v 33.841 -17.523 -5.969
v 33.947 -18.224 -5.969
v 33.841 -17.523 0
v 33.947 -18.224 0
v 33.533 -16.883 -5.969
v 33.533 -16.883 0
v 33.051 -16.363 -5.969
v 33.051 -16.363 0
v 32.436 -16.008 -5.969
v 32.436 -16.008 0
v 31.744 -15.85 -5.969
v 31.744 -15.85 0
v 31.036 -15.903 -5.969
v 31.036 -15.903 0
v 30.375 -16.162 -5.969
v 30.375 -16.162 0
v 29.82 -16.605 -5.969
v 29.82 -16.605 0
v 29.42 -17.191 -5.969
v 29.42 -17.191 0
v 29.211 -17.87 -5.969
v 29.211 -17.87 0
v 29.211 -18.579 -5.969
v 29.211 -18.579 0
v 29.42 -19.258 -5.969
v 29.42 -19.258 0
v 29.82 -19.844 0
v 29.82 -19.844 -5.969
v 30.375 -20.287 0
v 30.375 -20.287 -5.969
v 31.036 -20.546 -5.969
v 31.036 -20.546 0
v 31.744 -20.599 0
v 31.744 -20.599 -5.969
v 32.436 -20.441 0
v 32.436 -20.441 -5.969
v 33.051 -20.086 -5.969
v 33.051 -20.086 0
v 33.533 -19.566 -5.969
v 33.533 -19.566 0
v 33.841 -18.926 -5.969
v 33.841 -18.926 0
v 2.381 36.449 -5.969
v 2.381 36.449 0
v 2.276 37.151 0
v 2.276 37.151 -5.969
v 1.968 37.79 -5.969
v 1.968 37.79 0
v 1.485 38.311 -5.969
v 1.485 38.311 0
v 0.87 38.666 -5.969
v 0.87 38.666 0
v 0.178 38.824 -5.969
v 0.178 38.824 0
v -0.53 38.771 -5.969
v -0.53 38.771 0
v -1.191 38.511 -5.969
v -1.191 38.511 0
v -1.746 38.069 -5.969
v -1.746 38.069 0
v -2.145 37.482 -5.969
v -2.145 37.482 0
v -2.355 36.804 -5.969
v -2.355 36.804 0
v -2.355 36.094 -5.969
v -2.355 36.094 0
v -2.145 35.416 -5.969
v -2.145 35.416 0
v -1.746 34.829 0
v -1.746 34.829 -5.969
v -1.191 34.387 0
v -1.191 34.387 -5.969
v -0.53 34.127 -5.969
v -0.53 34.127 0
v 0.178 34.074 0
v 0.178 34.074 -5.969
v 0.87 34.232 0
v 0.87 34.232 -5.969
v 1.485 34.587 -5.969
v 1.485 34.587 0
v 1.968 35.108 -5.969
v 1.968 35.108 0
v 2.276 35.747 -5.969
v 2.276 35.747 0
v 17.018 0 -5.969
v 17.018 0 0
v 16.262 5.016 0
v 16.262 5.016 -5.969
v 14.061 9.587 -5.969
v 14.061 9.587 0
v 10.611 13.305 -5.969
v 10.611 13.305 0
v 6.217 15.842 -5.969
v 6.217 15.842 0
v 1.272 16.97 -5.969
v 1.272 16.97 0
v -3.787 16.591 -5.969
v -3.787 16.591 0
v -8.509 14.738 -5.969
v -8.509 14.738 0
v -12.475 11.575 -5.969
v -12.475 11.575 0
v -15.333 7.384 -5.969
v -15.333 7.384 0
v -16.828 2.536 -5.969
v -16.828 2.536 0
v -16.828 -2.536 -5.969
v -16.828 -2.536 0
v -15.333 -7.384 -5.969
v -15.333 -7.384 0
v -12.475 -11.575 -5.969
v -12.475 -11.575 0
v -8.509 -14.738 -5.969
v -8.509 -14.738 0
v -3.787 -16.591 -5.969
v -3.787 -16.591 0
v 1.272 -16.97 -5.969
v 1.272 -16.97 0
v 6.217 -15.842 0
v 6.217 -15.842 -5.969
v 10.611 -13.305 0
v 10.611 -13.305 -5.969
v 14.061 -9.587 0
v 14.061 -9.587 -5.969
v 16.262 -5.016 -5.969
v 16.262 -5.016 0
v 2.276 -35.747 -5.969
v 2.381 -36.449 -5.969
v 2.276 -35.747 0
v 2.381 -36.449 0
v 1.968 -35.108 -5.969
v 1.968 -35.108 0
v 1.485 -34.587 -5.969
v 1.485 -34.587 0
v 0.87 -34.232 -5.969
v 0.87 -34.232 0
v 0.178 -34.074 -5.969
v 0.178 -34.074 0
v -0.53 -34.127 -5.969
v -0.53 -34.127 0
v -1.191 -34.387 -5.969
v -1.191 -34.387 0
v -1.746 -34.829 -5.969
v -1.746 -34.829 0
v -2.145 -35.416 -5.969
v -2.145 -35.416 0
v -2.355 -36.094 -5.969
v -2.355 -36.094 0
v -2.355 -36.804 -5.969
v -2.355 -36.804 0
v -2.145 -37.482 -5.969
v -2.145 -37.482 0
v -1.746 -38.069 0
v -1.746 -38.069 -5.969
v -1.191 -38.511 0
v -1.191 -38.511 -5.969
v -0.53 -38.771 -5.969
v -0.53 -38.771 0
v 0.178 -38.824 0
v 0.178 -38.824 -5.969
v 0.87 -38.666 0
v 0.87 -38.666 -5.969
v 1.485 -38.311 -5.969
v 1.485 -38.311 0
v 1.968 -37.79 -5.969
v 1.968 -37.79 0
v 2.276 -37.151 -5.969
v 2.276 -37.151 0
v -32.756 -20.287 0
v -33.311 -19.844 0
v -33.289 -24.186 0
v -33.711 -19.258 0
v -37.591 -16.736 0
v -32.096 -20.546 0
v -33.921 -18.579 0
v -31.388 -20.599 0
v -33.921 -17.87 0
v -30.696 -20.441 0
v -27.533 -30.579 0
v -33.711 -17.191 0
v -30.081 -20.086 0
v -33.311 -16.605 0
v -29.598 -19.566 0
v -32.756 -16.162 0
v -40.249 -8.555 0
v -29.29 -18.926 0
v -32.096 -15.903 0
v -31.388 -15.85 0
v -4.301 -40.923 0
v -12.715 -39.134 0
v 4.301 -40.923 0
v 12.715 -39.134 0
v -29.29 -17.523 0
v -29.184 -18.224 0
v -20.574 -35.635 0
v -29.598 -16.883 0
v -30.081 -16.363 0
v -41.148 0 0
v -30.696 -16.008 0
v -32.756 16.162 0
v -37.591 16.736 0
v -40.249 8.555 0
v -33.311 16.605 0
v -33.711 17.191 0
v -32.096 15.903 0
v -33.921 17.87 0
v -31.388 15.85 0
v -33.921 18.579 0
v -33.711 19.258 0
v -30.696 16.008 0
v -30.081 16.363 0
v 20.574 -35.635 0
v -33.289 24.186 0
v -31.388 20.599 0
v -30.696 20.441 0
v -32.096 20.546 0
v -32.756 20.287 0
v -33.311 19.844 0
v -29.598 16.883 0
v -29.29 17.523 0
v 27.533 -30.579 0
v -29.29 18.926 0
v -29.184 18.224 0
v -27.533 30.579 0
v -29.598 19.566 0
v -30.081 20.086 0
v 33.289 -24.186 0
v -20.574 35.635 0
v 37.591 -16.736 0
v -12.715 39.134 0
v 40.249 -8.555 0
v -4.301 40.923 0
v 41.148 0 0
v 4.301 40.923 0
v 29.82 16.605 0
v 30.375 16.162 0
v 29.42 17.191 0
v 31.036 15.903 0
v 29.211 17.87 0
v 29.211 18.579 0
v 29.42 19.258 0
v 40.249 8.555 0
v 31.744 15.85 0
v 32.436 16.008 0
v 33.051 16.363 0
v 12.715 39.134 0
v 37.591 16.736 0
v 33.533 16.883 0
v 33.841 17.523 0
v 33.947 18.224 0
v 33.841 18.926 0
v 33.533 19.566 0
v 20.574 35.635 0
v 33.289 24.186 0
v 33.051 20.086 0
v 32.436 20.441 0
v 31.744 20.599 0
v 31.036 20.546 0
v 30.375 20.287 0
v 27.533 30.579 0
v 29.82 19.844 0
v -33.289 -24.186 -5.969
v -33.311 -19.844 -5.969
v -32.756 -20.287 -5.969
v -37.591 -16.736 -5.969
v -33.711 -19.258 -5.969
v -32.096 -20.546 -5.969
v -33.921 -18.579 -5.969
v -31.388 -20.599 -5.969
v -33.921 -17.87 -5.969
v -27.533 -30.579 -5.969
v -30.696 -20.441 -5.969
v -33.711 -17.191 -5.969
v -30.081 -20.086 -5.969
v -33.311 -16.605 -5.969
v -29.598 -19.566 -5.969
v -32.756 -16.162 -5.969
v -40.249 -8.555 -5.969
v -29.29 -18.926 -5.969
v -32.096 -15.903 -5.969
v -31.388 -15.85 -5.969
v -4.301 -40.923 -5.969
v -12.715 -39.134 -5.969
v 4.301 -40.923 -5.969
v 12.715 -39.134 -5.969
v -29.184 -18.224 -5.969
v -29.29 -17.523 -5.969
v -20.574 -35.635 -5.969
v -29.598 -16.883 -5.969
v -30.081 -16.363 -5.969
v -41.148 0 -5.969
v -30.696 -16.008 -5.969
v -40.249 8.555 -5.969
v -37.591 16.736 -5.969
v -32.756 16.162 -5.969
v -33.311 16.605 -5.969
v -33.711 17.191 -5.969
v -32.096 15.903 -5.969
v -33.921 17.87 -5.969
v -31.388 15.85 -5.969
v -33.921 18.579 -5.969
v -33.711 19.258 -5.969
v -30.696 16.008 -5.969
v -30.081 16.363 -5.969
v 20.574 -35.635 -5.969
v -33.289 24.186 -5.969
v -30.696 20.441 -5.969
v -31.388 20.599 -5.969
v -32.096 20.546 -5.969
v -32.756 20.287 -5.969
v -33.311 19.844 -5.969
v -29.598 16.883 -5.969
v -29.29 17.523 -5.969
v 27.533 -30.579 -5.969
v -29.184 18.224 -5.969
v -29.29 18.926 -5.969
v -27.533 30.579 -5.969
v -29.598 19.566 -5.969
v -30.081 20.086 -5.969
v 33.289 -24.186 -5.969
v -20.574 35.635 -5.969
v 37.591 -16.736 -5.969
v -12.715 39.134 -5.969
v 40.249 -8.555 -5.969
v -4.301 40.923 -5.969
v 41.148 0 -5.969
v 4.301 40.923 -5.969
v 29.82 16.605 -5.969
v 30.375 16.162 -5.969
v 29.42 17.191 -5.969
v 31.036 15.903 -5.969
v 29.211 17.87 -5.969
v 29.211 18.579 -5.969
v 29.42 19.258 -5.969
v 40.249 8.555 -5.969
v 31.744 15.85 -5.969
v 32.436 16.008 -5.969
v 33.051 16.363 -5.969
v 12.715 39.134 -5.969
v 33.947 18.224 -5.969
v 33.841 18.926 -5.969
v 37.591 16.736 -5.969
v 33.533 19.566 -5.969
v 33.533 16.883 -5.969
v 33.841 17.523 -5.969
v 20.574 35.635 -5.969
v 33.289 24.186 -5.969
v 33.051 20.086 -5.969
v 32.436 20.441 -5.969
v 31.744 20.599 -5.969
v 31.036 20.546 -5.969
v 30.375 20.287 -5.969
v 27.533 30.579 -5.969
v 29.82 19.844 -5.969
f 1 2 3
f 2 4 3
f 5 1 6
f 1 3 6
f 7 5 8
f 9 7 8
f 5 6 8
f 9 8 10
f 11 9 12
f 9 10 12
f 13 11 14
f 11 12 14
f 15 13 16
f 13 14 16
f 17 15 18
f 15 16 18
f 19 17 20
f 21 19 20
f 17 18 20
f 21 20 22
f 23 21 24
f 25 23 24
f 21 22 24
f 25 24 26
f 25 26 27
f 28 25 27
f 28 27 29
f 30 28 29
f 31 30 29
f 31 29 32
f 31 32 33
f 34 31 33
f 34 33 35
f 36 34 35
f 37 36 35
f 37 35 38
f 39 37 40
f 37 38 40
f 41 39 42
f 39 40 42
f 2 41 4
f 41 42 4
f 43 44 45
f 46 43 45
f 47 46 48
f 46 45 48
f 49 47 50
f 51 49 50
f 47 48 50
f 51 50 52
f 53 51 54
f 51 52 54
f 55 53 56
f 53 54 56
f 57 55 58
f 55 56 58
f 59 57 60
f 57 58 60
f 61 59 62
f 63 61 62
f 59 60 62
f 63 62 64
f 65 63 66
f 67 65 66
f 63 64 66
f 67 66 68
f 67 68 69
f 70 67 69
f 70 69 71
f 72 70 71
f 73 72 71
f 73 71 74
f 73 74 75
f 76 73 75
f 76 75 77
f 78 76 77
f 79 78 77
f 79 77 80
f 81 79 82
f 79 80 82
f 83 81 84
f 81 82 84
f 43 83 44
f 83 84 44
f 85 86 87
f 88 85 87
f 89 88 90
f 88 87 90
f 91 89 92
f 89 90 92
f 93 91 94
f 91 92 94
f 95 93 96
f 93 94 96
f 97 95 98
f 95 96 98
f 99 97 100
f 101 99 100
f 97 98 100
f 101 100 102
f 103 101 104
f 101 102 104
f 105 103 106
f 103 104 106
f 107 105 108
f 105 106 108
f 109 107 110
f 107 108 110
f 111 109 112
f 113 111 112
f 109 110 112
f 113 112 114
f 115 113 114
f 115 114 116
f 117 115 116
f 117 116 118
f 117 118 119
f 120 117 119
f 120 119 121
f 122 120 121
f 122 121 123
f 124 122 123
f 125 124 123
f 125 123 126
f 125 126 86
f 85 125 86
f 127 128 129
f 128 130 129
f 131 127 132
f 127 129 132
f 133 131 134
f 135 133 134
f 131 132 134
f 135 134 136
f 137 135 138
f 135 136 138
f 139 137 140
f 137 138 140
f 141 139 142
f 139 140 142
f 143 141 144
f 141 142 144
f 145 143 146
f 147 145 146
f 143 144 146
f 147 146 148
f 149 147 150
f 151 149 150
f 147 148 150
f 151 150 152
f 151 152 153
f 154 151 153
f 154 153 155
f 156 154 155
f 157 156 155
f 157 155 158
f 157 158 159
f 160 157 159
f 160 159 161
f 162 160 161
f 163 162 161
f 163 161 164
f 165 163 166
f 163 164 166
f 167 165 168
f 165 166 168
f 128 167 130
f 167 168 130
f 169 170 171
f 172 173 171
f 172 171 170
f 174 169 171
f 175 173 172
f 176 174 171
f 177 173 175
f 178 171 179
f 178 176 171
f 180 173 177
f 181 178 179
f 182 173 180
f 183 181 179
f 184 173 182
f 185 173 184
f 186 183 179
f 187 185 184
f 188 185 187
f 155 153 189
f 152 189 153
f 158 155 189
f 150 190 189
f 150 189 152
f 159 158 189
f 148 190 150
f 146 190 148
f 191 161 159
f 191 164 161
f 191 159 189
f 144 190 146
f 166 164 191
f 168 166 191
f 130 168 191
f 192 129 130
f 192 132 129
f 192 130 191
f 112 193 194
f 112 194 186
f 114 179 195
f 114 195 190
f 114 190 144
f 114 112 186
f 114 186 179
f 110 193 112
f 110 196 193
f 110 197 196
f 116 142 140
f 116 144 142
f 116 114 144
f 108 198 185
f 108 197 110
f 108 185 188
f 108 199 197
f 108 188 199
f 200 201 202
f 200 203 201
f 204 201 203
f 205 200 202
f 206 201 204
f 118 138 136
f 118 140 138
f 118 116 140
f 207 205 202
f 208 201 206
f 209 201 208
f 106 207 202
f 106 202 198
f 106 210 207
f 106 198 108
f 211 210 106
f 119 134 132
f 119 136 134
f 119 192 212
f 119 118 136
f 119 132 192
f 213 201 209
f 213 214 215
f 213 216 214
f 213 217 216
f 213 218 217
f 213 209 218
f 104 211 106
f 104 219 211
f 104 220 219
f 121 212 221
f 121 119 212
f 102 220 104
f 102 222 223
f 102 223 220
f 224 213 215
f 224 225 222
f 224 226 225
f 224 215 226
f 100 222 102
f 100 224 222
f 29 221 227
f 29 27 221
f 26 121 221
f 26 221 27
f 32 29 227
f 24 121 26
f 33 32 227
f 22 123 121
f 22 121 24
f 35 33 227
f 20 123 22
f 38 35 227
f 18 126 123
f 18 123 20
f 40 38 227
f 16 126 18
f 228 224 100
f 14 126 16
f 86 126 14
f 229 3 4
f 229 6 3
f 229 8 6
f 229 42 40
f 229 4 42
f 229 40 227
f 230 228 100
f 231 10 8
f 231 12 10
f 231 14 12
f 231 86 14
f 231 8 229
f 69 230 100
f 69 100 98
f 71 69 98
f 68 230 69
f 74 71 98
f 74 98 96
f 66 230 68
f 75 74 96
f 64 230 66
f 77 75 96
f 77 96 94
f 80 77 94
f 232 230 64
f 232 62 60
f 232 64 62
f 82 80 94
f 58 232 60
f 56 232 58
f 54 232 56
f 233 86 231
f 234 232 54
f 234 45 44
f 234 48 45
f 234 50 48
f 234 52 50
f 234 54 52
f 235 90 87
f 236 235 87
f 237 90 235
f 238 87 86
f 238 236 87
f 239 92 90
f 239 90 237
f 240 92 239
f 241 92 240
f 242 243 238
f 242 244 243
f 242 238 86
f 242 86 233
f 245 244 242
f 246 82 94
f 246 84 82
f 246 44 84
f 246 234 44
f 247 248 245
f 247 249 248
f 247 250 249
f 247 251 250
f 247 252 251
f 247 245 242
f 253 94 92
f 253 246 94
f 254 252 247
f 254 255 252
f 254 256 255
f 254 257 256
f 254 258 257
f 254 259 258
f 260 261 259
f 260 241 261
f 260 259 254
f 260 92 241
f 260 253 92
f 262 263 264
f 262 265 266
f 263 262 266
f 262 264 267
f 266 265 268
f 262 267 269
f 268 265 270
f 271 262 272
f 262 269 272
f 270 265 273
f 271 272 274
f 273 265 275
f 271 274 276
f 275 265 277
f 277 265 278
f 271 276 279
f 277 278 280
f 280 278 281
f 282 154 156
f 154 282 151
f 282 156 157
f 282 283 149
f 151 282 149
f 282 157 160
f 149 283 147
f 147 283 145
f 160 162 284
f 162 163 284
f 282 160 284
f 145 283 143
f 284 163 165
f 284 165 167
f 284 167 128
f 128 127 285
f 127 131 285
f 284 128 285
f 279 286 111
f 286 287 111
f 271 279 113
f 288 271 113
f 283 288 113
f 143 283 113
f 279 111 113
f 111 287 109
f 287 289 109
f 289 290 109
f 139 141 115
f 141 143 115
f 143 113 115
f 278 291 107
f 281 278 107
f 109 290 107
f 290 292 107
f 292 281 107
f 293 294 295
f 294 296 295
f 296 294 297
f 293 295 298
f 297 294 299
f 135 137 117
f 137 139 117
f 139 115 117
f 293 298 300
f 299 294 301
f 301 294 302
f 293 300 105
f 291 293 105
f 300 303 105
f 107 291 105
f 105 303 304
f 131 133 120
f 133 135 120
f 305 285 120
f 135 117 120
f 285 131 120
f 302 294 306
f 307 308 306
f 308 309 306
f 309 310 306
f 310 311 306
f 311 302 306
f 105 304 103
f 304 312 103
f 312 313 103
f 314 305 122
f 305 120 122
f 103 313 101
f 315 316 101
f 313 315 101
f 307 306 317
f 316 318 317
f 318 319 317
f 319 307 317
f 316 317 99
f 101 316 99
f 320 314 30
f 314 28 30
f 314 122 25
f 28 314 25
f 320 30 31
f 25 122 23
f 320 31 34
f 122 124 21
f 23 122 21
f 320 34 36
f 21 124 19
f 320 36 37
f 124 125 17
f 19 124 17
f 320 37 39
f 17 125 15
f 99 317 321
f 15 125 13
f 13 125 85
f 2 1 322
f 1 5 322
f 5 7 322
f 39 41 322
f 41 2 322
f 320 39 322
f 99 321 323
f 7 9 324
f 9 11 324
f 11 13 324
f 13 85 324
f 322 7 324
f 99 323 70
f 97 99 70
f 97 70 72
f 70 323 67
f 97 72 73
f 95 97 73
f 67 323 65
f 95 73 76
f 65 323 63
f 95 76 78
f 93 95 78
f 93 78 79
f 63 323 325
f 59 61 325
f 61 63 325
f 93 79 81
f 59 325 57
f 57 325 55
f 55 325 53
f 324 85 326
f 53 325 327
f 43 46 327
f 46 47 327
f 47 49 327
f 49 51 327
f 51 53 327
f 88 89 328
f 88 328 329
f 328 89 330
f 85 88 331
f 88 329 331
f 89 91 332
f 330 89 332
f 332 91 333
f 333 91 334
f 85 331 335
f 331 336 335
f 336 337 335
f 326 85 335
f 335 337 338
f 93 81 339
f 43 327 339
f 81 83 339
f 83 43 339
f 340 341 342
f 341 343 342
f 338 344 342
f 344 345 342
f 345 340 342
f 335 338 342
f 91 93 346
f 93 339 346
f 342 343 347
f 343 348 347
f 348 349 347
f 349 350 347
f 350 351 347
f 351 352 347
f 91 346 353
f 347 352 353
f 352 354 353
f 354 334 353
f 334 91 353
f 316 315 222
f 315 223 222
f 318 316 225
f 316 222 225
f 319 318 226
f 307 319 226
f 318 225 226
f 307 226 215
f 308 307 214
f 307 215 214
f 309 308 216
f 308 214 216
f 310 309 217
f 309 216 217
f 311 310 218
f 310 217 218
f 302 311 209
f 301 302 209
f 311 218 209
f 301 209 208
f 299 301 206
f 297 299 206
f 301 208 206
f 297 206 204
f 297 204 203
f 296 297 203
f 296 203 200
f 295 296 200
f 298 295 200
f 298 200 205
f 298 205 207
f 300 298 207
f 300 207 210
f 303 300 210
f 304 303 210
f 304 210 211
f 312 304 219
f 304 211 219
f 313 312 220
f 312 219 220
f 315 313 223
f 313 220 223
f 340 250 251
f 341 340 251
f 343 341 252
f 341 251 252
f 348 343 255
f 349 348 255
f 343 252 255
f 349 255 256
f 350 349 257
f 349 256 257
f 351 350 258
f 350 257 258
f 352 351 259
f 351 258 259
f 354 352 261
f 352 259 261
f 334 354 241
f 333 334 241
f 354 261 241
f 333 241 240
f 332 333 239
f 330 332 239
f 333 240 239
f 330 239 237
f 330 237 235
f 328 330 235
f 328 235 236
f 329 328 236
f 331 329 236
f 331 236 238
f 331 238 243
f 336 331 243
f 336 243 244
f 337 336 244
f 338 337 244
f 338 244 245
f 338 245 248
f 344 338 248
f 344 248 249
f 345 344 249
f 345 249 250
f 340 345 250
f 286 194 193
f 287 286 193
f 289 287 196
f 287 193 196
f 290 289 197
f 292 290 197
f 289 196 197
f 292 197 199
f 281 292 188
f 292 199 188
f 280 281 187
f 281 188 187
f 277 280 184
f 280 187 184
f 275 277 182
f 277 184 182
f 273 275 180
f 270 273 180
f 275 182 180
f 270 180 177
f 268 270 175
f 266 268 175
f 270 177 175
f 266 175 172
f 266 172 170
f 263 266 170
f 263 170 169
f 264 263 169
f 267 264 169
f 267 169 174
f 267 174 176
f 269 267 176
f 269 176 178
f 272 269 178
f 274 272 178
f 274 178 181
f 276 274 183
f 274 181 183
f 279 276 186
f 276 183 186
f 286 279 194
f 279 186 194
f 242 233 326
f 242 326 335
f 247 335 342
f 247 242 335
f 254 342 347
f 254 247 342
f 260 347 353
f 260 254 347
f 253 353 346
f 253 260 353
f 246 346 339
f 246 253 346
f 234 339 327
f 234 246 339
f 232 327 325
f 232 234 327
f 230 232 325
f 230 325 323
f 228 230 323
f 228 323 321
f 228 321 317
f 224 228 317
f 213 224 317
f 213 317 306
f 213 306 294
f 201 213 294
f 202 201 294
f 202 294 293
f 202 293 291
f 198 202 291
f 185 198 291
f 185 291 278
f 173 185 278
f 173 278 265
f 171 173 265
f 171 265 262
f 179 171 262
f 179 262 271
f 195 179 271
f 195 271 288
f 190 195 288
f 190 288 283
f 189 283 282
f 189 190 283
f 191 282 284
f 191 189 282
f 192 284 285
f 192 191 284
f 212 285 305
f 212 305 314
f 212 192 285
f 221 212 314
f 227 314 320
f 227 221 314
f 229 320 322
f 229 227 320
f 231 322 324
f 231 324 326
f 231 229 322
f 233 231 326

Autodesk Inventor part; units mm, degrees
ref_plane "YZ Plane" through (0, 0, 0) normal (1, 0, 0) x (0, 1, 0)
ref_plane "XZ Plane" through (0, 0, 0) normal (0, 1, 0) x (-1, 0, 0)
ref_plane "XY Plane" through (0, 0, 0) normal (0, 0, 1) x (1, 0, 0)
sketch "Sketch1" plane through (0, 0, 0) normal (0, 0, 1) x (1, 0, 0)
  circle A0 centre (0, 0) radius 41.148
  dimension "d0" = 82.296
extrude "Extrusion1" add sketch "Sketch1" against normal blind 5.969
sketch "Sketch2" plane through (0, 0, 0) normal (0, 0, 1) x (1, 0, 0)
  circle A0 centre (0, 0) radius 17.018
  dimension "d3" = 34.036
extrude "Extrusion2" cut sketch "Sketch2" against normal blind 5.969
sketch "Sketch3" plane through (0, 0, 0) normal (0, 0, 1) x (1, 0, 0)
  circle A0 centre (0, 36.449) radius 2.3813
  circle A1 centre (-31.5658, 18.2245) radius 2.3813
  circle A2 centre (-31.5658, -18.2245) radius 2.3813
  circle A3 centre (0, -36.449) radius 2.3813
  circle A4 centre (31.5658, -18.2245) radius 2.3813
  circle A5 centre (31.5658, 18.2245) radius 2.3813
  point P0 (0, 0)
  dimension "d6" = 4.7625
  dimension "d9" = 360
extrude "Extrusion3" cut sketch "Sketch3" against normal blind 5.969
properties part number "retainRing4_4"
